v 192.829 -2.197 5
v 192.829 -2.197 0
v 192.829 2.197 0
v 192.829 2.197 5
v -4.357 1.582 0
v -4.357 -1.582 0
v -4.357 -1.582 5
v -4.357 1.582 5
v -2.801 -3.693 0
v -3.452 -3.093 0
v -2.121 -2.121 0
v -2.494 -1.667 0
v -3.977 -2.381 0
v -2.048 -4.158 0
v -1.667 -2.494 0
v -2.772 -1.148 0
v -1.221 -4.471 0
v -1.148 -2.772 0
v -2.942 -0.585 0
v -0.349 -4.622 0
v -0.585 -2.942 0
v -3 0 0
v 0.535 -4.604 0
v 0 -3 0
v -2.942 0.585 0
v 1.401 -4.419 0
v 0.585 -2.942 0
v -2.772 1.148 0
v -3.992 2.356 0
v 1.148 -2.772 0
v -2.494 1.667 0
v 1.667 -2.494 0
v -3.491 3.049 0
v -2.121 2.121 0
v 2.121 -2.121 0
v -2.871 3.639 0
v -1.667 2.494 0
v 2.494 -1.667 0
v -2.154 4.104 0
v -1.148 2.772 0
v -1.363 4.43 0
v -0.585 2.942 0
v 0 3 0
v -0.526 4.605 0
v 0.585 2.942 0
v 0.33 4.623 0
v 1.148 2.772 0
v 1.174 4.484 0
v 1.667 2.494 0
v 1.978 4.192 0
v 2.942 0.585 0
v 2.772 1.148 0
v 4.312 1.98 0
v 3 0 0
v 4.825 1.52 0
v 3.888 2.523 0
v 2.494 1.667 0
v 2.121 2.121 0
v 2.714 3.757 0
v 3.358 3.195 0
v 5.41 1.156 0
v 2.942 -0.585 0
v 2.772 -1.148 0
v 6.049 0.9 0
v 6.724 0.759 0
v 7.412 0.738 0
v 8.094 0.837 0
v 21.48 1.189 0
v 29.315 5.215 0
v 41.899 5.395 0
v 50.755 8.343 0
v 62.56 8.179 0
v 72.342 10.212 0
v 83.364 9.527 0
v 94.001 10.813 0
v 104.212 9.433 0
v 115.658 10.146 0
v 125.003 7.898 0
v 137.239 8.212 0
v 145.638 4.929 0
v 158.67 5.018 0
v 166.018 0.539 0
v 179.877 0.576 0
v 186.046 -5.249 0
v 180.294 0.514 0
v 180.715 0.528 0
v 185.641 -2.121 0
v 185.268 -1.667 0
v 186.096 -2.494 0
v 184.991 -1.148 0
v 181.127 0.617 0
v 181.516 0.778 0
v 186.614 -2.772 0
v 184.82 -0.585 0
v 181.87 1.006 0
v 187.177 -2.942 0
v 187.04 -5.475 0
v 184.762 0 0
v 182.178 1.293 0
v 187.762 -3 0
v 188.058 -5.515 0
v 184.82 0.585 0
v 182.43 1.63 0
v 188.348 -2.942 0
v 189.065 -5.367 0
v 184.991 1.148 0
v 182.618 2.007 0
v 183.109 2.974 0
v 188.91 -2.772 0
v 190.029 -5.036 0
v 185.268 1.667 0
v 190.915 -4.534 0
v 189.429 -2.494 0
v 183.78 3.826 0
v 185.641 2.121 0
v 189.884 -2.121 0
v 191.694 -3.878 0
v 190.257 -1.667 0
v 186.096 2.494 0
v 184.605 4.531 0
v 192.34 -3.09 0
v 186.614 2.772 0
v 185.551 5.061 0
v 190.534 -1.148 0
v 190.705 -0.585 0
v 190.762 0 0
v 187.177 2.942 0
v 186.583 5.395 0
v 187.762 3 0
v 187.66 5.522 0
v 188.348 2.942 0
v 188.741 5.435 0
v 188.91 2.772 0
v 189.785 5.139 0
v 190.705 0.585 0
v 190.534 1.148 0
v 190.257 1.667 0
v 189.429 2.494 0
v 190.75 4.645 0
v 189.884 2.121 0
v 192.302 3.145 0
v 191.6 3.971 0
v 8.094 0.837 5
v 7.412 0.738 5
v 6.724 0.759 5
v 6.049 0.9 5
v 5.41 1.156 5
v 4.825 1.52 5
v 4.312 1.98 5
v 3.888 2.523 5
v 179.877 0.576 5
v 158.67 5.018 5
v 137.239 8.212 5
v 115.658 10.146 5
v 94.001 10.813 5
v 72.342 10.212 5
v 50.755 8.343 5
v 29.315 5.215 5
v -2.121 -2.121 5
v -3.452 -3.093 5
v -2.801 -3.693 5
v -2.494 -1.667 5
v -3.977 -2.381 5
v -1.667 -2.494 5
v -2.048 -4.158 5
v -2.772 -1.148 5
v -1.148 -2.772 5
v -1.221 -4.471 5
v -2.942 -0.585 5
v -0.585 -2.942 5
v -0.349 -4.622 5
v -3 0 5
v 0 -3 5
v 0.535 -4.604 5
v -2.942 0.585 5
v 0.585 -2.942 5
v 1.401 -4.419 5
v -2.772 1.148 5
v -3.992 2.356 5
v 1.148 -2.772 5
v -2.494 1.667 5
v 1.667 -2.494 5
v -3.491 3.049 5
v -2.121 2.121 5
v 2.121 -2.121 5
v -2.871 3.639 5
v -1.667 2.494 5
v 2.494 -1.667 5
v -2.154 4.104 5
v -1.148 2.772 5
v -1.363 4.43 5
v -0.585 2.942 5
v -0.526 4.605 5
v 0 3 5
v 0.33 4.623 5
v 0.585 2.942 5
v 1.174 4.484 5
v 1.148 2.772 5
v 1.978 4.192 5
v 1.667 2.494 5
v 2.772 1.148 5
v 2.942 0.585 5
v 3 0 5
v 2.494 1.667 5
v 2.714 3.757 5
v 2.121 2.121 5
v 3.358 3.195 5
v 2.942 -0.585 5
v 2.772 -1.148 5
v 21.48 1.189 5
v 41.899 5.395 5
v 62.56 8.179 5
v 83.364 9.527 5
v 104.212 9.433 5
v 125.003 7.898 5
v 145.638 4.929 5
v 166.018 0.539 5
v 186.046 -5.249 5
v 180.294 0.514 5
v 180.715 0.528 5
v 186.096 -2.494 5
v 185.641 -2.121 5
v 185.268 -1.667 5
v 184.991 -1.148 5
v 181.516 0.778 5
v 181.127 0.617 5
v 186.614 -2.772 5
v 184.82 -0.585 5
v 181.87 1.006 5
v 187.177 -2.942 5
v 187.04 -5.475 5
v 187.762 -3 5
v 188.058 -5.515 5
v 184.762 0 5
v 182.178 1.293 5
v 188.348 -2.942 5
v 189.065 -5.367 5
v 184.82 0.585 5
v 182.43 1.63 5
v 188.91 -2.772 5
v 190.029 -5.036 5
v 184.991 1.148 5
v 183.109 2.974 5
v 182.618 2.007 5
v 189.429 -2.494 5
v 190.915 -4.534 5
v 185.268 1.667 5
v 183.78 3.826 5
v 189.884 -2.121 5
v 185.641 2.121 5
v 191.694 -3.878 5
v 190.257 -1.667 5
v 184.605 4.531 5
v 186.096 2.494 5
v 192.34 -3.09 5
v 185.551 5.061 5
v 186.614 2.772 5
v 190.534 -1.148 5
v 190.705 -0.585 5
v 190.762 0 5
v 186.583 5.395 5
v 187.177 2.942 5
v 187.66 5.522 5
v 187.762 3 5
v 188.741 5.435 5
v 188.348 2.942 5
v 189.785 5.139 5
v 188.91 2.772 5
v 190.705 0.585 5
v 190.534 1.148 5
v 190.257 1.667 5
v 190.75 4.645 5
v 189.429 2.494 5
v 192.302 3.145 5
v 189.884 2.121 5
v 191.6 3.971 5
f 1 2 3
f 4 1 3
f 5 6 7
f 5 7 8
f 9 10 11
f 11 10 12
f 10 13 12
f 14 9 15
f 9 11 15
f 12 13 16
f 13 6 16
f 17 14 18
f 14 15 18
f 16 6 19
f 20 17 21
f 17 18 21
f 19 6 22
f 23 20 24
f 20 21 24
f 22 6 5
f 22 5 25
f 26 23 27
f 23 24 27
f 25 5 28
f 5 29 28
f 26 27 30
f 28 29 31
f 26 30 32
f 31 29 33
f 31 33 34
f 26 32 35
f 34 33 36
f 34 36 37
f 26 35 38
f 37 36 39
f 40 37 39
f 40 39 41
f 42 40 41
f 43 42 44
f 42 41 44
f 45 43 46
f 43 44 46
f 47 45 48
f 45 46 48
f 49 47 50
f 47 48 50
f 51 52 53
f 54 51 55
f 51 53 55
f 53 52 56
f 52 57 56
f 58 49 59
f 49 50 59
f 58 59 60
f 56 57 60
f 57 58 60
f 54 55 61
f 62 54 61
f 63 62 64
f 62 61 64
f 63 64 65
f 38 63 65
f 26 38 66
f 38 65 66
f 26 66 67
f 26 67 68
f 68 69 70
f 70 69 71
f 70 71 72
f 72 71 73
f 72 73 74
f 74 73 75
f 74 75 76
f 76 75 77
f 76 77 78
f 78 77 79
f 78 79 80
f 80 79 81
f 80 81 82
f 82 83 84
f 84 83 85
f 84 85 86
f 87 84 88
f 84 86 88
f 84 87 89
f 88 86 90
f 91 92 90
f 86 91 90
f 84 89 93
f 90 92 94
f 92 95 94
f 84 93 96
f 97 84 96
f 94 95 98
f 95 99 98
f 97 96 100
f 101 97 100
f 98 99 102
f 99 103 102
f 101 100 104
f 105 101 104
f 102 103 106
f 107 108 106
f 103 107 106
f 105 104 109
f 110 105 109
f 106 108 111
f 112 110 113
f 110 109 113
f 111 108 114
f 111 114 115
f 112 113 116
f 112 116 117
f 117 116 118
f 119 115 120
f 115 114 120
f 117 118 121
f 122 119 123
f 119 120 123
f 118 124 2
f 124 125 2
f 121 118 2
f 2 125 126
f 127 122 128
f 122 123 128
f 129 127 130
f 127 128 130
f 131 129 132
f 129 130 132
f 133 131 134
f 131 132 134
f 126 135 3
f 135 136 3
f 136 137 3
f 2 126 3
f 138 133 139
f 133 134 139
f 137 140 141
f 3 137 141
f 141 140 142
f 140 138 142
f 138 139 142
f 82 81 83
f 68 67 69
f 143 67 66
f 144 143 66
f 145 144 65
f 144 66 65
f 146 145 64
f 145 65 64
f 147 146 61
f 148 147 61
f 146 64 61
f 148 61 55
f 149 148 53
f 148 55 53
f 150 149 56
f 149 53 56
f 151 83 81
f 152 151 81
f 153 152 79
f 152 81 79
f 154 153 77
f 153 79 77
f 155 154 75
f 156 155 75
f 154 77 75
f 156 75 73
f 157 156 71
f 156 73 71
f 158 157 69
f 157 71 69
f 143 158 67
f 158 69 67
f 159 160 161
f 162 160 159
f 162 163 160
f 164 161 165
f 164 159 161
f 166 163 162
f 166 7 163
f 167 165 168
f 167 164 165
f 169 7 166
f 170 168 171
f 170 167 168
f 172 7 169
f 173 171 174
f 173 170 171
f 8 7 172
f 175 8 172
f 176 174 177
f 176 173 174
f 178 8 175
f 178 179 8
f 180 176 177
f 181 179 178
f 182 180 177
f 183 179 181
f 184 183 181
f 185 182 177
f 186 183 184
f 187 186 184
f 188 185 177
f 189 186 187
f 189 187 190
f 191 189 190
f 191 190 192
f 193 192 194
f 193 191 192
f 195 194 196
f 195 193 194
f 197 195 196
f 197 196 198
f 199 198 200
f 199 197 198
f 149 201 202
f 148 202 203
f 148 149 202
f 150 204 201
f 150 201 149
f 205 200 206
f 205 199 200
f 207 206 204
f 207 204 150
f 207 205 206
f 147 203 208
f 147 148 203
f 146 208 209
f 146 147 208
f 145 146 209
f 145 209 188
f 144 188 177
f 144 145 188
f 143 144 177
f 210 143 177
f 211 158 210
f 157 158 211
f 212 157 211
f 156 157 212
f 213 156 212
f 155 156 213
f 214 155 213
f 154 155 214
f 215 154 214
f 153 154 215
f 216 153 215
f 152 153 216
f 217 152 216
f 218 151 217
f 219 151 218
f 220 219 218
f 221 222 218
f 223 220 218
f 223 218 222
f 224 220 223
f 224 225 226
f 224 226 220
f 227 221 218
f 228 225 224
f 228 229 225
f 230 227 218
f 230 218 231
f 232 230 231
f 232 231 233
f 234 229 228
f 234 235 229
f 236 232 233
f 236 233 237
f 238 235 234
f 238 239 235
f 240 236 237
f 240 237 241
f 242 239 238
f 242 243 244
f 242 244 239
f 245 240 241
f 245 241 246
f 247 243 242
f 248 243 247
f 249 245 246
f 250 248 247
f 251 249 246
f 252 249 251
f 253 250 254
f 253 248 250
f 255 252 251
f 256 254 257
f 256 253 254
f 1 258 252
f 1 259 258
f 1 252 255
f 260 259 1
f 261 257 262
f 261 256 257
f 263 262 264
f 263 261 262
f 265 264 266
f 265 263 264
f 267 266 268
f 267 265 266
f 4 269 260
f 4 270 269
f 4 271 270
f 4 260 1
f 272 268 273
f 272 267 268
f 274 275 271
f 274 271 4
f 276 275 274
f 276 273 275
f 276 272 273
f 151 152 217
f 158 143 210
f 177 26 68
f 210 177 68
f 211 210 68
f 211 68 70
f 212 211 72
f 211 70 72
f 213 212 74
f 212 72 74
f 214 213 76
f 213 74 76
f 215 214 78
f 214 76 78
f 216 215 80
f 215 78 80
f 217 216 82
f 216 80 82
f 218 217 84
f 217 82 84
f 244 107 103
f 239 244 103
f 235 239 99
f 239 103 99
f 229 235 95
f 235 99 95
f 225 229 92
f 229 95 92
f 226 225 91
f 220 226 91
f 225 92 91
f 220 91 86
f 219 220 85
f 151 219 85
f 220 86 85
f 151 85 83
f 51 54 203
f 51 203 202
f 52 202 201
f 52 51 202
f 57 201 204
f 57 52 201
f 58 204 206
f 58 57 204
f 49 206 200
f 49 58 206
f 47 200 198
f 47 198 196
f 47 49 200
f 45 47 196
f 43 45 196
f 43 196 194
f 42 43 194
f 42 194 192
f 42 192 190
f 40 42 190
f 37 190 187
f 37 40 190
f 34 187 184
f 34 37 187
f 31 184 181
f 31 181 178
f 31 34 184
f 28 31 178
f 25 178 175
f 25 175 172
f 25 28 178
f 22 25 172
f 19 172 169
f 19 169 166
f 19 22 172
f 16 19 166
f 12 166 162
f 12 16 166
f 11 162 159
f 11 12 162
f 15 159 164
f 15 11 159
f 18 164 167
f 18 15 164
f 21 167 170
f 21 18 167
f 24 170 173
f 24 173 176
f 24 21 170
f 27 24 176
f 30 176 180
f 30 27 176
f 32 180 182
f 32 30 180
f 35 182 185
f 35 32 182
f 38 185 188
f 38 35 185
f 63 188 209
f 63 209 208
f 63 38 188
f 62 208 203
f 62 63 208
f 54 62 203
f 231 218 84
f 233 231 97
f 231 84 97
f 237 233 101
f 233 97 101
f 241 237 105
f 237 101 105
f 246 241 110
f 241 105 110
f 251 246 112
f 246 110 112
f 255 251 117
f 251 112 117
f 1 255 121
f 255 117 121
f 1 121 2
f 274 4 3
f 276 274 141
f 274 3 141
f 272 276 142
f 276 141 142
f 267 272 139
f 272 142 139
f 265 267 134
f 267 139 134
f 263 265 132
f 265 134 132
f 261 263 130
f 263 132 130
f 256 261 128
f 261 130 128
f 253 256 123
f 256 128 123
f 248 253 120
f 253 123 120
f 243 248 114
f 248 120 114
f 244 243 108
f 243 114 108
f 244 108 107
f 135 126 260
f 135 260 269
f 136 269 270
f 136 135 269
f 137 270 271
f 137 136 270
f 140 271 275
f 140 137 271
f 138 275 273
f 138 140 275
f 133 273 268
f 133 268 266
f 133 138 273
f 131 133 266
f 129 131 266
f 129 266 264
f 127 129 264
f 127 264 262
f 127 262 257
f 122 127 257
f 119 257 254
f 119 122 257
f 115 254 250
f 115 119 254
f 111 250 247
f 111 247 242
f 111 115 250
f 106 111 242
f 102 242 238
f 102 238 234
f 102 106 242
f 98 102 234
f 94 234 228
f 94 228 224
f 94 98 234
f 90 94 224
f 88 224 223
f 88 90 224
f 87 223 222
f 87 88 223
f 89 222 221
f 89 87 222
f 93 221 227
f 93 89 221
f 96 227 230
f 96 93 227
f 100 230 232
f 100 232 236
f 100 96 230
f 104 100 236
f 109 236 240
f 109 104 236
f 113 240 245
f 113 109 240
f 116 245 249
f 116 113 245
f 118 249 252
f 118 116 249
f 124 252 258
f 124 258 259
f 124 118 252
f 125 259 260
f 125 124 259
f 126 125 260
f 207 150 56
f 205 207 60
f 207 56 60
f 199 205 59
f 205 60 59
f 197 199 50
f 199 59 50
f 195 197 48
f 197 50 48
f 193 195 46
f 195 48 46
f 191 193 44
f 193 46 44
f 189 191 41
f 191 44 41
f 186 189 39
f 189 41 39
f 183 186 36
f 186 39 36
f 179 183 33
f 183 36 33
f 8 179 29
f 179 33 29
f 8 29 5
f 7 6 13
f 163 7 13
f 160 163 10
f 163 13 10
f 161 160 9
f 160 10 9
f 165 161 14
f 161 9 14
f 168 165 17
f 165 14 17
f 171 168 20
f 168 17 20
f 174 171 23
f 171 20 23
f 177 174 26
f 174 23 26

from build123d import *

# Parameters (mm, degrees)
SZKIC1_R                    = 3.000000079
DODANIE_WYCI_GNI_CIE1_DEPTH = 5
SZKIC2_W                    = 1.618528634
SZKIC2_H                    = 7.505645785
SZKIC2_W_2                  = 0.651830256
SZKIC2_H_2                  = 5.051684483
WYTNIJ_WYCI_GNI_CIE3_DEPTH  = 6


with BuildPart() as part:
    # Szkic1 → Dodanie-wyciągnięcie1 (new body)
    with BuildSketch(Plane.XY):
        with BuildLine():
            ThreePointArc((186.046385231, -5.249250637), (192.755682752, 2.359335985), (182.617563383, 2.007484775))
            ThreePointArc((182.617563383, 2.007484775), (181.515861501, 0.778055334), (179.877474491, 0.575739249))
            ThreePointArc((179.877474491, 0.575739249), (94.00112496, 10.812901668), (8.093987839, 0.837396921))
            ThreePointArc((8.093987839, 0.837396921), (5.72392167, 1.013694647), (3.88824622, 2.523194623))
            ThreePointArc((3.88824622, 2.523194623), (-4.363457527, 1.563716145), (1.400567067, -4.418527092))
            ThreePointArc((1.400567067, -4.418527092), (93.788687704, 9.660753619), (186.046385231, -5.249250637))
        make_face()
        Circle(SZKIC1_R, mode=Mode.SUBTRACT)
        with Locations((187.7624, 0)):
            Circle(SZKIC1_R, mode=Mode.SUBTRACT)
    extrude(amount=DODANIE_WYCI_GNI_CIE1_DEPTH)

    # Szkic2 → Wytnij-wyciągnięcie3 (cut, through all)
    with BuildSketch(Plane.XY):
        with Locations((193.638606269, 0.381285041)):
            Rectangle(SZKIC2_W, SZKIC2_H)
        with Locations((-4.682734605, -0.038745932)):
            Rectangle(SZKIC2_W_2, SZKIC2_H_2)
    extrude(amount=WYTNIJ_WYCI_GNI_CIE3_DEPTH, mode=Mode.SUBTRACT)


solid = part.part
